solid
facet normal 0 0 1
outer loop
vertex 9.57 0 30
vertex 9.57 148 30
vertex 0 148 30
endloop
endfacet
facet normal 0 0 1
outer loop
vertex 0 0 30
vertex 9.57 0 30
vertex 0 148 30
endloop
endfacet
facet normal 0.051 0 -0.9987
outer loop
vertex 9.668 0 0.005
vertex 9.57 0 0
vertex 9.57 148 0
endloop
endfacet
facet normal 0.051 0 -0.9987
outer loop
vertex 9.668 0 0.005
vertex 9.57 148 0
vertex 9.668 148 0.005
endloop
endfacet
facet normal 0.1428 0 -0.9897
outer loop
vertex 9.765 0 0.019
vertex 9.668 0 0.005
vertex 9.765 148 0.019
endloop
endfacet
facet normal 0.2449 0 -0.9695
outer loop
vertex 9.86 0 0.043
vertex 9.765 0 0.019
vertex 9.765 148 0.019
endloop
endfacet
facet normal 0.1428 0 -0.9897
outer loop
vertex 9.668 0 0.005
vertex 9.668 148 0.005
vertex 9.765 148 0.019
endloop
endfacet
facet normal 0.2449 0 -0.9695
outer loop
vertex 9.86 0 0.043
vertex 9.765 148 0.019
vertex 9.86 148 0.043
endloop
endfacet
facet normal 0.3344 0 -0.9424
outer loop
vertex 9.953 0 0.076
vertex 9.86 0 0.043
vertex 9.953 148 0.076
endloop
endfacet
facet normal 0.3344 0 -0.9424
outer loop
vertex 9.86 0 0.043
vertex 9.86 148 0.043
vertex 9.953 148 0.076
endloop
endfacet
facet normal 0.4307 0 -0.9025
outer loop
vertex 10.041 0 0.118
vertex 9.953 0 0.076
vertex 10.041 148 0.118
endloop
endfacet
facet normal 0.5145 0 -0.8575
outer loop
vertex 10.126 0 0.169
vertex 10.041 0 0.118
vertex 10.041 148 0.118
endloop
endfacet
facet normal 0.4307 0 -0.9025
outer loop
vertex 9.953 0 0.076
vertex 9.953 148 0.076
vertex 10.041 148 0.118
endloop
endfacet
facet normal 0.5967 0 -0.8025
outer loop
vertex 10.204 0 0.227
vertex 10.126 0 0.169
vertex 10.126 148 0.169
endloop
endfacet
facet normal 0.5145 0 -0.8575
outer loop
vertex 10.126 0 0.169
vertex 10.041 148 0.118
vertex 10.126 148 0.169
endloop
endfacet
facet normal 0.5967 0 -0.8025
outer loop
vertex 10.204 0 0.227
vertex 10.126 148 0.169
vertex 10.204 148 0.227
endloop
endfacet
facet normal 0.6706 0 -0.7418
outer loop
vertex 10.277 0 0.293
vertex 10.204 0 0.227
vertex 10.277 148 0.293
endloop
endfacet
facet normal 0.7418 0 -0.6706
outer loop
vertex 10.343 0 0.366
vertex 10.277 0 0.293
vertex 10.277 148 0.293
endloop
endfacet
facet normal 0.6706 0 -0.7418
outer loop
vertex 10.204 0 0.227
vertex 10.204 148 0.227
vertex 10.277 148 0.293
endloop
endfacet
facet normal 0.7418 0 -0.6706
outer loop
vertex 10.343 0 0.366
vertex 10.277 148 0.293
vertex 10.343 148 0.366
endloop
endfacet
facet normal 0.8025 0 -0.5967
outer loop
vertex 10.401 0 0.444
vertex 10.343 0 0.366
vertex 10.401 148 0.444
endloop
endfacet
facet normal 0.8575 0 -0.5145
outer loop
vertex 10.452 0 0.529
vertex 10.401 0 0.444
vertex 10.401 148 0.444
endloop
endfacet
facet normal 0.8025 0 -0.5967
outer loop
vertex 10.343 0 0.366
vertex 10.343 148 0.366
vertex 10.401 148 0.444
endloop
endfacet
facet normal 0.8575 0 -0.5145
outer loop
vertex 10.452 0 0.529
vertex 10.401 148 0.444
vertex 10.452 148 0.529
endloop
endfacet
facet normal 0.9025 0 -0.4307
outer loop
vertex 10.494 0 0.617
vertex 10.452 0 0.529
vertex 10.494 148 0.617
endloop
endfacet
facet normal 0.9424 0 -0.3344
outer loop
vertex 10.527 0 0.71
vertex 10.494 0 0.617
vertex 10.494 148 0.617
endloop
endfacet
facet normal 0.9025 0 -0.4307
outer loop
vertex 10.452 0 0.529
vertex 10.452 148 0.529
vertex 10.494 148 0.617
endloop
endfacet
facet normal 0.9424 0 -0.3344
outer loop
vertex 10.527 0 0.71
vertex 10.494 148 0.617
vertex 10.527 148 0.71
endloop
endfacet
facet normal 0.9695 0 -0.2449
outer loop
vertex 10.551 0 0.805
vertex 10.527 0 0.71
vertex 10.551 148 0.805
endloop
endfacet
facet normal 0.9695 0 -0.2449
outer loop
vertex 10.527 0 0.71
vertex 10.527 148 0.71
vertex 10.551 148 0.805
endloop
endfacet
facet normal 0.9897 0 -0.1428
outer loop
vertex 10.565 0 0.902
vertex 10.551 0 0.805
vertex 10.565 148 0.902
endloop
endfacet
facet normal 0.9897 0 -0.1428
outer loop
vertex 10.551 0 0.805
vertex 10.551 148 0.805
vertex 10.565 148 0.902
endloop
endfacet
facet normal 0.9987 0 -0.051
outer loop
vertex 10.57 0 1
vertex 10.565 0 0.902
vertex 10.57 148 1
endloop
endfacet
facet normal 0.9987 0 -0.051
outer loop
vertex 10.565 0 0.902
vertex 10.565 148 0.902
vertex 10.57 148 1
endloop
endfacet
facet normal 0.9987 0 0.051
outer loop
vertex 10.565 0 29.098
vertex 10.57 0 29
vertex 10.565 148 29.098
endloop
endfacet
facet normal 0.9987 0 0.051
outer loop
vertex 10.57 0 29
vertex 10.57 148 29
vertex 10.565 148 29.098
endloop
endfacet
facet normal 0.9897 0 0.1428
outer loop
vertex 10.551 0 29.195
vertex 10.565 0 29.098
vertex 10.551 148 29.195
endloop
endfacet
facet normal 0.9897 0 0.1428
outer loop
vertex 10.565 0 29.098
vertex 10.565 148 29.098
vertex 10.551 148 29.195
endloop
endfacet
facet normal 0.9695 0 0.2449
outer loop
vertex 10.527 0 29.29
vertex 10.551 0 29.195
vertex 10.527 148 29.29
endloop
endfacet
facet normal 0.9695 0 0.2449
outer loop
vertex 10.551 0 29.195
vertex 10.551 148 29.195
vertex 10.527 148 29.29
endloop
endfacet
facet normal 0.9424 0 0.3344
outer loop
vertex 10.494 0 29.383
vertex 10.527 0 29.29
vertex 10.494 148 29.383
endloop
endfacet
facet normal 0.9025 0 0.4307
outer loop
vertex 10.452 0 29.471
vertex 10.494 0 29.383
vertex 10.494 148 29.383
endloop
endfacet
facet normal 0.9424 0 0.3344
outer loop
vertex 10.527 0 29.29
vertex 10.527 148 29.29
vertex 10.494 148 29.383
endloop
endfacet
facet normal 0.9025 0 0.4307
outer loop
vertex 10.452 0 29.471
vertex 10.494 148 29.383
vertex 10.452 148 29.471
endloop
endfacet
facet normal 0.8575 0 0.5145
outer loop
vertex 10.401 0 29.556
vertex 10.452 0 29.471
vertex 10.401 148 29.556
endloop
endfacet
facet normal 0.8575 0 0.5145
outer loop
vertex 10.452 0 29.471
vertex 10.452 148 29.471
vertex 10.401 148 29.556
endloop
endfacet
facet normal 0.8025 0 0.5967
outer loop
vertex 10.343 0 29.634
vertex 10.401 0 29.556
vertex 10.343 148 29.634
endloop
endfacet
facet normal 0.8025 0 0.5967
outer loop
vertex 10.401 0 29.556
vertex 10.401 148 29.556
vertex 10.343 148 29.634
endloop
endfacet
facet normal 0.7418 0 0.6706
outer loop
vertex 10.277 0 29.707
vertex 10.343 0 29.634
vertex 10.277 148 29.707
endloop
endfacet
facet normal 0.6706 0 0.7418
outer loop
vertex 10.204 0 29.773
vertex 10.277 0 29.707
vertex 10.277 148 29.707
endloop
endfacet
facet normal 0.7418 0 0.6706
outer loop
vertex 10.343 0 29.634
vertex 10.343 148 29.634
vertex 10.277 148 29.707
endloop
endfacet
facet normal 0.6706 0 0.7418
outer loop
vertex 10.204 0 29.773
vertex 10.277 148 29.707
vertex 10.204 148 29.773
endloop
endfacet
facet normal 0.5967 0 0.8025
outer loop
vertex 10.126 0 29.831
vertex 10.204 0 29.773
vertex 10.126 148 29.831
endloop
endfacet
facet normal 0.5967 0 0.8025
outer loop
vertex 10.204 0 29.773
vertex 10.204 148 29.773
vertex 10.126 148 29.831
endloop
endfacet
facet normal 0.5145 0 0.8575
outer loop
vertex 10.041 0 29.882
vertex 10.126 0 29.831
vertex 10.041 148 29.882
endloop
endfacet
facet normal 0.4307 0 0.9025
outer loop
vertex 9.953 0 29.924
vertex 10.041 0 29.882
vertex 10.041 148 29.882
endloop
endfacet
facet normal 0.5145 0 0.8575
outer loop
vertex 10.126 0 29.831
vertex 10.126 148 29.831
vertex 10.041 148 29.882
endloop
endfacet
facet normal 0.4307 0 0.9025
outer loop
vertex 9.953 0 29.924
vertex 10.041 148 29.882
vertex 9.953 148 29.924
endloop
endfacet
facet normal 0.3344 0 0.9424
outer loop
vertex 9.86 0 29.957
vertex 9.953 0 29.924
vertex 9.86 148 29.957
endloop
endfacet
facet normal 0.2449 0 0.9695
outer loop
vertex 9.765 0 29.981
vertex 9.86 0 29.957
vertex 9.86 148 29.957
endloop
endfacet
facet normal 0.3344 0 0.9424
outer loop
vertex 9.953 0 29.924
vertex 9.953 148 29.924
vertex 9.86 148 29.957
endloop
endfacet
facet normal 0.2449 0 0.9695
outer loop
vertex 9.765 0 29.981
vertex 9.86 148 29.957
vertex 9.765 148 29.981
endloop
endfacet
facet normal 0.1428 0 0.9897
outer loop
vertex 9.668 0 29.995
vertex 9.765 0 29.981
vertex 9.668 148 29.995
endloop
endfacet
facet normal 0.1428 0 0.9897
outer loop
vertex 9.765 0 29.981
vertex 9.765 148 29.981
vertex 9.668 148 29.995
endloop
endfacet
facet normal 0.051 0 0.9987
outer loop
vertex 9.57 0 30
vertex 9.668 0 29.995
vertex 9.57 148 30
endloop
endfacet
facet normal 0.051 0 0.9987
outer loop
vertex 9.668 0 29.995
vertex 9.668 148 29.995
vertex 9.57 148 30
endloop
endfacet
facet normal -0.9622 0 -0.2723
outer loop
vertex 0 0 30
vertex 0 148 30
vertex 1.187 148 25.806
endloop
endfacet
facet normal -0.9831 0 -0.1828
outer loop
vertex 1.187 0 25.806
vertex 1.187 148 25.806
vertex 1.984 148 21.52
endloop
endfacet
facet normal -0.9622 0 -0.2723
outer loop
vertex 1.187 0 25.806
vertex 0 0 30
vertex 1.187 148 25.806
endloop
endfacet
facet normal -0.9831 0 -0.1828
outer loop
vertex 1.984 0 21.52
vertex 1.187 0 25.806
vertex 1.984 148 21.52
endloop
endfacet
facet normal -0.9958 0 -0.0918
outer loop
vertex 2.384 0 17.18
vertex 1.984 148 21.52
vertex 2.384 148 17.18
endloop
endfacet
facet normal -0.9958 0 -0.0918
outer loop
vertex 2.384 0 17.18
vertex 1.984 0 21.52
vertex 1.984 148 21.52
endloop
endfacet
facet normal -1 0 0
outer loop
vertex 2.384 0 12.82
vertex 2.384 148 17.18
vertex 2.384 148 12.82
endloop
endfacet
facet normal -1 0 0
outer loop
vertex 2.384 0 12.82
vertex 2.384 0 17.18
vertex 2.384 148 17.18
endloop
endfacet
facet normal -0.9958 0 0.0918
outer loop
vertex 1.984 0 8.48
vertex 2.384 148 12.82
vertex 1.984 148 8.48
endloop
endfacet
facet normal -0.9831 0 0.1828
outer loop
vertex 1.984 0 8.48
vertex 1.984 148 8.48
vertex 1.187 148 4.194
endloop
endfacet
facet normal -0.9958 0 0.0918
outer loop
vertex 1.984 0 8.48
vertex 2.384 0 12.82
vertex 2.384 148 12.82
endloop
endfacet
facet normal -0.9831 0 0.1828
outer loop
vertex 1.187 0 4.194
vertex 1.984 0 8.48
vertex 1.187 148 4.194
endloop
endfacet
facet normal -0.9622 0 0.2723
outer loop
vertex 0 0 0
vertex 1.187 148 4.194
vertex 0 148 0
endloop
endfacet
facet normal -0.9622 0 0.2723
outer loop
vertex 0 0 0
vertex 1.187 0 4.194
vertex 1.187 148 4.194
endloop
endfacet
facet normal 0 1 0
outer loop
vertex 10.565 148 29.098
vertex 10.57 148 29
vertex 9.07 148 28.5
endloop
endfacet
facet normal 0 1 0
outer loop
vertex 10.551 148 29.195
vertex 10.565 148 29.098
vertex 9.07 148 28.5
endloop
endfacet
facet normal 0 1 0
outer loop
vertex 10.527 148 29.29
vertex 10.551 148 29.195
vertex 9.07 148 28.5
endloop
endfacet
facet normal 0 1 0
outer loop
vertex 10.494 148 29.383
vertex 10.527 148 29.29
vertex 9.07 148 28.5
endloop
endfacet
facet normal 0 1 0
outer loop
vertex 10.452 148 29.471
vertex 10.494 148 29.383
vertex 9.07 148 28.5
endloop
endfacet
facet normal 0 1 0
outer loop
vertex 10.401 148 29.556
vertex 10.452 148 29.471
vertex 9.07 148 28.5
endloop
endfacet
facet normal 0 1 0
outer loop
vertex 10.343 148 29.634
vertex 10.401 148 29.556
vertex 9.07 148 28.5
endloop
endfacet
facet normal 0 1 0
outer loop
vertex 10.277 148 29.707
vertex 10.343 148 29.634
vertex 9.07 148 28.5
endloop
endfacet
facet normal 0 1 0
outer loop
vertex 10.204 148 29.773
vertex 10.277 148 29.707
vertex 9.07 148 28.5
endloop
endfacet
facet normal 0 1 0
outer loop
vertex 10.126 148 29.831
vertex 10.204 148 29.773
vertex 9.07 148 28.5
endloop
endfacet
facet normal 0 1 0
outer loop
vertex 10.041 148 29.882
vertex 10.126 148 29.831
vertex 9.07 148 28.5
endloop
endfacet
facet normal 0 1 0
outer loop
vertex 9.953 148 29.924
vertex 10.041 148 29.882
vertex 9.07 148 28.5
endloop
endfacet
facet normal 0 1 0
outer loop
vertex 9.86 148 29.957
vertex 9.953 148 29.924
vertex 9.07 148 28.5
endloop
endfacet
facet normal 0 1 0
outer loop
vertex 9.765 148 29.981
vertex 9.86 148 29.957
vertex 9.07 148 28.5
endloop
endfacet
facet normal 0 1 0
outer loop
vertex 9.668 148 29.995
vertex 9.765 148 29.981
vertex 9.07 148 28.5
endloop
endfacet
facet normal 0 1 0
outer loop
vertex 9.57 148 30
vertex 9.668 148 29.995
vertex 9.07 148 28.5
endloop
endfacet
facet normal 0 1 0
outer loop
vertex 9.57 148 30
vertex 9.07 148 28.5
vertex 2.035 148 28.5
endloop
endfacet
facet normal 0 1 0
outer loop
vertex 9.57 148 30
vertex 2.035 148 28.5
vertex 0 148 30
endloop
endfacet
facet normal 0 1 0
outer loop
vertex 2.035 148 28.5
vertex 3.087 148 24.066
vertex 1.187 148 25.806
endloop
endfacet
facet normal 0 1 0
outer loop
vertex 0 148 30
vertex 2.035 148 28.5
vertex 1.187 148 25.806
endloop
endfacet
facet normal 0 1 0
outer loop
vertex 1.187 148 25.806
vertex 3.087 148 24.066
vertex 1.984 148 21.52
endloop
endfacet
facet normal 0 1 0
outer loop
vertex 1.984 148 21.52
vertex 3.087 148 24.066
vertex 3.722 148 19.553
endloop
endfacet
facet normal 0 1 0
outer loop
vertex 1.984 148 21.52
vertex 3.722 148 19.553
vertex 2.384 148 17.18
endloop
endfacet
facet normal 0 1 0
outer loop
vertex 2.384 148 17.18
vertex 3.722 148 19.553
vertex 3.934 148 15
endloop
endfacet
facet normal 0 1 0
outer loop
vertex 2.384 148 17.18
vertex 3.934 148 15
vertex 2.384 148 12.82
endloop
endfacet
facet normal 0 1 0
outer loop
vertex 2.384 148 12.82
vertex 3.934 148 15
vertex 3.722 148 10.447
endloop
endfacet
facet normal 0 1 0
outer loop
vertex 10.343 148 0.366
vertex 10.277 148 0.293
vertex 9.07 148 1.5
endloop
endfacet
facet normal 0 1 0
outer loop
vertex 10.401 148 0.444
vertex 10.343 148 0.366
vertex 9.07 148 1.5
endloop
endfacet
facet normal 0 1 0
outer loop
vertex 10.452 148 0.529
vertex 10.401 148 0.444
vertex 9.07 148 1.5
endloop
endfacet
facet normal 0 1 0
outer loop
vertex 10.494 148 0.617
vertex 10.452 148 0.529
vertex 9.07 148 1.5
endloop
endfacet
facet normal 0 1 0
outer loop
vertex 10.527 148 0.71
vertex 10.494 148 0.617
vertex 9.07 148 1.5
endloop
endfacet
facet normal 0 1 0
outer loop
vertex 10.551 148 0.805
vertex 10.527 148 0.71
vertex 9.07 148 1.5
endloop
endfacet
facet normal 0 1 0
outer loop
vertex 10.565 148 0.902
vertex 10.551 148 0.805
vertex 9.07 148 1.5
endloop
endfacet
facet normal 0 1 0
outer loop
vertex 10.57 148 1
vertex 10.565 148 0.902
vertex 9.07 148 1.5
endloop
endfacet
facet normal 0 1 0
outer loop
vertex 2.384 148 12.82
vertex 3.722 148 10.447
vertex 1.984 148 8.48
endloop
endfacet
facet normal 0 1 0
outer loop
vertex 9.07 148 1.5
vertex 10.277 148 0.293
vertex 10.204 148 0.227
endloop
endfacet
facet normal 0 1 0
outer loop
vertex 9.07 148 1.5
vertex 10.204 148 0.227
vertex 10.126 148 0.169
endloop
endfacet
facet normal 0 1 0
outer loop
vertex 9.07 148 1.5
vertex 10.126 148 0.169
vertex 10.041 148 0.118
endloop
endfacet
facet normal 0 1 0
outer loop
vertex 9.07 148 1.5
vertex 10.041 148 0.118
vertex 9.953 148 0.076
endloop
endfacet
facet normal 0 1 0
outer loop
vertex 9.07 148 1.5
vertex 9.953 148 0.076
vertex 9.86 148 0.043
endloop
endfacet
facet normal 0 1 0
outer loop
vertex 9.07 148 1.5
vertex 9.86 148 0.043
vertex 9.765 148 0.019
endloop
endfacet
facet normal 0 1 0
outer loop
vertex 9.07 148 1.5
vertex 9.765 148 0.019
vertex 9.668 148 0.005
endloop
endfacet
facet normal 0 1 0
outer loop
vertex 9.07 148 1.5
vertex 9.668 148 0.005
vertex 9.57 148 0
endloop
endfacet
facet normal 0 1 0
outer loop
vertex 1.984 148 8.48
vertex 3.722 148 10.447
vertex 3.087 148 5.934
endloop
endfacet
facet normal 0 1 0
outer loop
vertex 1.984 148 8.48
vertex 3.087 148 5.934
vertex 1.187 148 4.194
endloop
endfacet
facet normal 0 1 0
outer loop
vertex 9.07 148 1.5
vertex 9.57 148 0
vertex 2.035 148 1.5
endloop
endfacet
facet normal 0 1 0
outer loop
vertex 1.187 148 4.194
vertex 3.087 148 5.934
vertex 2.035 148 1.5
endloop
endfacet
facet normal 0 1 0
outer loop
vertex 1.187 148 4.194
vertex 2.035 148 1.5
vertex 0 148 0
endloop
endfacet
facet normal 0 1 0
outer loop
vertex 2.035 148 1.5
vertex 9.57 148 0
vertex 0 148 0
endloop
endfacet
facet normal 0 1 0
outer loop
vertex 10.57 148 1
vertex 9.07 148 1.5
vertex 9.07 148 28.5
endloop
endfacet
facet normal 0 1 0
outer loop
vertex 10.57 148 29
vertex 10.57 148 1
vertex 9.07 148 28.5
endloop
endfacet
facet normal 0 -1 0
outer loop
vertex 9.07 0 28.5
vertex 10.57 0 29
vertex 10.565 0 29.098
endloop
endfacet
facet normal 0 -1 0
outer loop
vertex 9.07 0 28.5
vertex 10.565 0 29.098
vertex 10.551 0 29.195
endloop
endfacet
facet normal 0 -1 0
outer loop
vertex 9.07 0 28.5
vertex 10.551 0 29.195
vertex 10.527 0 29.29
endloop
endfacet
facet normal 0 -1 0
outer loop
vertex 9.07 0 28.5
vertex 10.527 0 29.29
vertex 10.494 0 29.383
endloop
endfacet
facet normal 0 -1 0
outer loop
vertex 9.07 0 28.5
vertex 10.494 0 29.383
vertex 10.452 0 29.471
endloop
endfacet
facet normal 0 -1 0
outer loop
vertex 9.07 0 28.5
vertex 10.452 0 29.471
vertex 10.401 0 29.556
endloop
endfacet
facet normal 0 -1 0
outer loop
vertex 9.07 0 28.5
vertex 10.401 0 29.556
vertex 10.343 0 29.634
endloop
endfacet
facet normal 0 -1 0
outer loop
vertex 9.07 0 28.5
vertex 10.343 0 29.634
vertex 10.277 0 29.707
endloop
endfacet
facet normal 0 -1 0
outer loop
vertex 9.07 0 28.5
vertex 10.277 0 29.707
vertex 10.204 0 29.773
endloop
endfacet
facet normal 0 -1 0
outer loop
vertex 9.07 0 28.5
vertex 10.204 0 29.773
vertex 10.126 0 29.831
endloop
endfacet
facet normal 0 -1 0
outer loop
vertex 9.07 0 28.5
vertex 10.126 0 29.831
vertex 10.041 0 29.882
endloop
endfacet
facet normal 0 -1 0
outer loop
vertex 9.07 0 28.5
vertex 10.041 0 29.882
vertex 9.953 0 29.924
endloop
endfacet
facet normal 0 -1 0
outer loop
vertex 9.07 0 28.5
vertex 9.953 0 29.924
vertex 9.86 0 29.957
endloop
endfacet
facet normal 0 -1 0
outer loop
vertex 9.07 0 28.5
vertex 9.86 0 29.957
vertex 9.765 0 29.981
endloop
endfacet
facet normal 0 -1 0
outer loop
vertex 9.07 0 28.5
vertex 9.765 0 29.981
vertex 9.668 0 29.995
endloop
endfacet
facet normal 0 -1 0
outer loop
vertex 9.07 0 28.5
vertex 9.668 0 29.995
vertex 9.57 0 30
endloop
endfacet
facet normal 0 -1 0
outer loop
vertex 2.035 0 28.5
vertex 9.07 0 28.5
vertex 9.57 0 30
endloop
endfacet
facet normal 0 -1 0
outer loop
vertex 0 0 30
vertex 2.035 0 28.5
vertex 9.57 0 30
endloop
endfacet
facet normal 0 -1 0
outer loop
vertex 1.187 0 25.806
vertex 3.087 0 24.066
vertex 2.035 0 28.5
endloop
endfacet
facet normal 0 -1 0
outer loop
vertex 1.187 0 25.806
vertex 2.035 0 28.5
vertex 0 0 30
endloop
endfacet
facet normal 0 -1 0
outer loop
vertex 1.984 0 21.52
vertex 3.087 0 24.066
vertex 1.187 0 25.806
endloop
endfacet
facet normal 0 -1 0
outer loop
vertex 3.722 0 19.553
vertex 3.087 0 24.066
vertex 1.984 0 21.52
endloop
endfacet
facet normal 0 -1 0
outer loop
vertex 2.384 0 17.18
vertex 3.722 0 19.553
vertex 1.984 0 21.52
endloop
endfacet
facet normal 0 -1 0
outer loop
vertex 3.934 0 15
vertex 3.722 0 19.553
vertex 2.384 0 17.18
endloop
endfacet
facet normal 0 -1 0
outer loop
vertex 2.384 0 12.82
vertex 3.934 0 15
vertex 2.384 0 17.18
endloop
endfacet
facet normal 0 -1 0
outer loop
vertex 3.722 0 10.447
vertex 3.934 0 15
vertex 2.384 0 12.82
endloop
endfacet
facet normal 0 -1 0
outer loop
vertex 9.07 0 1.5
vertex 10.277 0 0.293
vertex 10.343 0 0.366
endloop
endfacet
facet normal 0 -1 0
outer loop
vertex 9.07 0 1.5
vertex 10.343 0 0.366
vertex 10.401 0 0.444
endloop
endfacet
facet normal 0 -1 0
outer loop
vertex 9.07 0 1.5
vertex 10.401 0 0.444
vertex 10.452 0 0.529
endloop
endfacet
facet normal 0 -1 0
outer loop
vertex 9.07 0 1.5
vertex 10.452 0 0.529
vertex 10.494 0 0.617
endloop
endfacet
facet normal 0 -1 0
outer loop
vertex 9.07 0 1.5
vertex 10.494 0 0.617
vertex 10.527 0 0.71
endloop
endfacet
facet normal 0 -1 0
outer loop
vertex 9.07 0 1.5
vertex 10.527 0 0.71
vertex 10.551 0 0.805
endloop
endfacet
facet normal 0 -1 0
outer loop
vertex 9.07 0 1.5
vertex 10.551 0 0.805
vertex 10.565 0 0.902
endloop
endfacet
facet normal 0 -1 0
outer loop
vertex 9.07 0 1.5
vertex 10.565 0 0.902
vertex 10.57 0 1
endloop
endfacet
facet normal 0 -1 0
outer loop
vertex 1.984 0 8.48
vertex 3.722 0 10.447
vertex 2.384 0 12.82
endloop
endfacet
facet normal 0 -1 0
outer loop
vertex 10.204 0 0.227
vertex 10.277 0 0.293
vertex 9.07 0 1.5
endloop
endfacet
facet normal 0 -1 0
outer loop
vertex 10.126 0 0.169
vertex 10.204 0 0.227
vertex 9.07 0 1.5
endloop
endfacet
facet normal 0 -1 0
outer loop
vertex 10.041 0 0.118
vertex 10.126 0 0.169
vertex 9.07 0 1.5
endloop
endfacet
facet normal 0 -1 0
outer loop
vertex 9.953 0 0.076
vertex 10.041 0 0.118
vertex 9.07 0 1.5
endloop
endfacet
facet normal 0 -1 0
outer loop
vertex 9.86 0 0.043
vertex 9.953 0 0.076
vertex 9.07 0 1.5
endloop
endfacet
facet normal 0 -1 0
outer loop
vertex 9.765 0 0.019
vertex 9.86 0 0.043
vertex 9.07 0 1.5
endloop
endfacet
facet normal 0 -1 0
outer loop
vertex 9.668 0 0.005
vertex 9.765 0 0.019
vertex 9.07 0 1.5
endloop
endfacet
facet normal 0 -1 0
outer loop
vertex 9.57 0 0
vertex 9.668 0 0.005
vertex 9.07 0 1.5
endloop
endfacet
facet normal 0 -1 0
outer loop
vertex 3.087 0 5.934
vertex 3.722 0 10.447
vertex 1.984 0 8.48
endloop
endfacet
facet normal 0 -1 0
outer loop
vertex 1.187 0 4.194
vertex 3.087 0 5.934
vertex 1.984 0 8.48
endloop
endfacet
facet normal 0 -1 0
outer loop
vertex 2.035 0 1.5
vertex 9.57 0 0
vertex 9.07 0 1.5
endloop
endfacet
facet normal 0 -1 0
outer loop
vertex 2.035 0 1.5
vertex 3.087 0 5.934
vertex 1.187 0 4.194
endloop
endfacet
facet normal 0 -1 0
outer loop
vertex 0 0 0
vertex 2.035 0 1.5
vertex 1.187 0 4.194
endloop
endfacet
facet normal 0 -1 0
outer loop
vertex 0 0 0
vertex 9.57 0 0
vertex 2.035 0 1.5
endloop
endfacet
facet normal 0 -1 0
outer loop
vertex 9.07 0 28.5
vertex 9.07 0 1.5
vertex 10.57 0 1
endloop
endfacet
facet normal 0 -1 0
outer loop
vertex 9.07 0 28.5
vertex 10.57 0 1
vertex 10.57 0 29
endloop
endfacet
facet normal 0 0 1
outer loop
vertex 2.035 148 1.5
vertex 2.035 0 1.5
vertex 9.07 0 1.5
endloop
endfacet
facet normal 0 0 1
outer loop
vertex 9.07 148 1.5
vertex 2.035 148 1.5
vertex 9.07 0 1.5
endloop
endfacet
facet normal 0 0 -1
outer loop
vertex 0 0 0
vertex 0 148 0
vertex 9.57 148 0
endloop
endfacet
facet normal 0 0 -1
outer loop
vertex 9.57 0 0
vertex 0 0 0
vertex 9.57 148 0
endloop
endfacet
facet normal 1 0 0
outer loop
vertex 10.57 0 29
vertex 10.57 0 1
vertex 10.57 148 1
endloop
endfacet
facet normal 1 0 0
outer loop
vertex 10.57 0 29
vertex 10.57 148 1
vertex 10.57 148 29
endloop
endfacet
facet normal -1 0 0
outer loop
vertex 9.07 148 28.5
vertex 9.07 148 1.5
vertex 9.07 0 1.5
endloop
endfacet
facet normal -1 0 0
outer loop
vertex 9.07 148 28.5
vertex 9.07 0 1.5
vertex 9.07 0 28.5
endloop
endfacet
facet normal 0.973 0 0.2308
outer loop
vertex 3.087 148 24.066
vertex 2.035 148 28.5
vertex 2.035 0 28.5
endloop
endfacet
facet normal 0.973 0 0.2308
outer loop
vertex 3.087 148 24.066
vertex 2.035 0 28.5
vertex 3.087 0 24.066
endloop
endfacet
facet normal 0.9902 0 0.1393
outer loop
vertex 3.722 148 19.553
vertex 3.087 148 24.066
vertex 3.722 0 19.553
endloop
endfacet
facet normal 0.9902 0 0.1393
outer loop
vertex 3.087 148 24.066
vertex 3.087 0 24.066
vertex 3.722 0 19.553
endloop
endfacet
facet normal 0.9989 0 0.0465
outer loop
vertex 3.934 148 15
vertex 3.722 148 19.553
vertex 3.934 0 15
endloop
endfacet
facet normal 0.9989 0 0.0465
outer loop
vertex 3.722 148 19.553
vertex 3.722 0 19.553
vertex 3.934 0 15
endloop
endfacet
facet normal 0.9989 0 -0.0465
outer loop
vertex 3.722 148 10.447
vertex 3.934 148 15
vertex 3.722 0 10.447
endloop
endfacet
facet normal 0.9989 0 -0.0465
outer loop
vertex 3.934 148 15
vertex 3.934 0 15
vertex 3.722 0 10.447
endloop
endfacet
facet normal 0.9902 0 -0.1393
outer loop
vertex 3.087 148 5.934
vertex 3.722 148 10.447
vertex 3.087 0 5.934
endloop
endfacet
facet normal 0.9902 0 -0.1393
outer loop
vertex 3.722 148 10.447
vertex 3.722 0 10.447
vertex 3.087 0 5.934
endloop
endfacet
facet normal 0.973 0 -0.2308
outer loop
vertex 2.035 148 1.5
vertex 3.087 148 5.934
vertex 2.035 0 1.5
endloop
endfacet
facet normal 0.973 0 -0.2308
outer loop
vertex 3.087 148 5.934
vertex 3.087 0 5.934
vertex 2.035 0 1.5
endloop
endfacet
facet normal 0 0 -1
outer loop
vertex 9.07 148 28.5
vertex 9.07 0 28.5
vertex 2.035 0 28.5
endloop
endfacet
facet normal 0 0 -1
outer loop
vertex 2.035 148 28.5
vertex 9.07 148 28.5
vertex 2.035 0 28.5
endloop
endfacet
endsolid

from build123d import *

# Parameters (mm, degrees)
BOSS_EXTRUDE1_DEPTH = 148
FILLET1_R           = 1
SHELL1_T            = -1.5


with BuildPart() as part:
    # Sketch1 → Boss-Extrude1 (new body)
    with BuildSketch(Plane(origin=(0, 0, 0), x_dir=(1, 0, 0), z_dir=(0, 1, 0))):
        with BuildLine():
            Line((0, 0), (10.57, 0))
            Line((10.57, 0), (10.57, -30))
            Line((10.57, -30), (0, -30))
            ThreePointArc((0, -30), (2.434164903, -15), (0, 0))
        make_face()
    extrude(amount=BOSS_EXTRUDE1_DEPTH)

    # Fillet1
    fillet1_edges = [part.edges().sort_by_distance(p)[0] for p in [
        (10.57, 74, 0),
        (10.57, 74, 30),
    ]]
    fillet(fillet1_edges, radius=FILLET1_R)

    # Shell1
    shell1_openings = [part.faces().sort_by_distance(p)[0] for p in [
        (6.064557182, 148, 15),
        (6.064557182, 0, 15),
    ]]
    offset(amount=SHELL1_T, openings=shell1_openings, kind=Kind.INTERSECTION)


solid = part.part
